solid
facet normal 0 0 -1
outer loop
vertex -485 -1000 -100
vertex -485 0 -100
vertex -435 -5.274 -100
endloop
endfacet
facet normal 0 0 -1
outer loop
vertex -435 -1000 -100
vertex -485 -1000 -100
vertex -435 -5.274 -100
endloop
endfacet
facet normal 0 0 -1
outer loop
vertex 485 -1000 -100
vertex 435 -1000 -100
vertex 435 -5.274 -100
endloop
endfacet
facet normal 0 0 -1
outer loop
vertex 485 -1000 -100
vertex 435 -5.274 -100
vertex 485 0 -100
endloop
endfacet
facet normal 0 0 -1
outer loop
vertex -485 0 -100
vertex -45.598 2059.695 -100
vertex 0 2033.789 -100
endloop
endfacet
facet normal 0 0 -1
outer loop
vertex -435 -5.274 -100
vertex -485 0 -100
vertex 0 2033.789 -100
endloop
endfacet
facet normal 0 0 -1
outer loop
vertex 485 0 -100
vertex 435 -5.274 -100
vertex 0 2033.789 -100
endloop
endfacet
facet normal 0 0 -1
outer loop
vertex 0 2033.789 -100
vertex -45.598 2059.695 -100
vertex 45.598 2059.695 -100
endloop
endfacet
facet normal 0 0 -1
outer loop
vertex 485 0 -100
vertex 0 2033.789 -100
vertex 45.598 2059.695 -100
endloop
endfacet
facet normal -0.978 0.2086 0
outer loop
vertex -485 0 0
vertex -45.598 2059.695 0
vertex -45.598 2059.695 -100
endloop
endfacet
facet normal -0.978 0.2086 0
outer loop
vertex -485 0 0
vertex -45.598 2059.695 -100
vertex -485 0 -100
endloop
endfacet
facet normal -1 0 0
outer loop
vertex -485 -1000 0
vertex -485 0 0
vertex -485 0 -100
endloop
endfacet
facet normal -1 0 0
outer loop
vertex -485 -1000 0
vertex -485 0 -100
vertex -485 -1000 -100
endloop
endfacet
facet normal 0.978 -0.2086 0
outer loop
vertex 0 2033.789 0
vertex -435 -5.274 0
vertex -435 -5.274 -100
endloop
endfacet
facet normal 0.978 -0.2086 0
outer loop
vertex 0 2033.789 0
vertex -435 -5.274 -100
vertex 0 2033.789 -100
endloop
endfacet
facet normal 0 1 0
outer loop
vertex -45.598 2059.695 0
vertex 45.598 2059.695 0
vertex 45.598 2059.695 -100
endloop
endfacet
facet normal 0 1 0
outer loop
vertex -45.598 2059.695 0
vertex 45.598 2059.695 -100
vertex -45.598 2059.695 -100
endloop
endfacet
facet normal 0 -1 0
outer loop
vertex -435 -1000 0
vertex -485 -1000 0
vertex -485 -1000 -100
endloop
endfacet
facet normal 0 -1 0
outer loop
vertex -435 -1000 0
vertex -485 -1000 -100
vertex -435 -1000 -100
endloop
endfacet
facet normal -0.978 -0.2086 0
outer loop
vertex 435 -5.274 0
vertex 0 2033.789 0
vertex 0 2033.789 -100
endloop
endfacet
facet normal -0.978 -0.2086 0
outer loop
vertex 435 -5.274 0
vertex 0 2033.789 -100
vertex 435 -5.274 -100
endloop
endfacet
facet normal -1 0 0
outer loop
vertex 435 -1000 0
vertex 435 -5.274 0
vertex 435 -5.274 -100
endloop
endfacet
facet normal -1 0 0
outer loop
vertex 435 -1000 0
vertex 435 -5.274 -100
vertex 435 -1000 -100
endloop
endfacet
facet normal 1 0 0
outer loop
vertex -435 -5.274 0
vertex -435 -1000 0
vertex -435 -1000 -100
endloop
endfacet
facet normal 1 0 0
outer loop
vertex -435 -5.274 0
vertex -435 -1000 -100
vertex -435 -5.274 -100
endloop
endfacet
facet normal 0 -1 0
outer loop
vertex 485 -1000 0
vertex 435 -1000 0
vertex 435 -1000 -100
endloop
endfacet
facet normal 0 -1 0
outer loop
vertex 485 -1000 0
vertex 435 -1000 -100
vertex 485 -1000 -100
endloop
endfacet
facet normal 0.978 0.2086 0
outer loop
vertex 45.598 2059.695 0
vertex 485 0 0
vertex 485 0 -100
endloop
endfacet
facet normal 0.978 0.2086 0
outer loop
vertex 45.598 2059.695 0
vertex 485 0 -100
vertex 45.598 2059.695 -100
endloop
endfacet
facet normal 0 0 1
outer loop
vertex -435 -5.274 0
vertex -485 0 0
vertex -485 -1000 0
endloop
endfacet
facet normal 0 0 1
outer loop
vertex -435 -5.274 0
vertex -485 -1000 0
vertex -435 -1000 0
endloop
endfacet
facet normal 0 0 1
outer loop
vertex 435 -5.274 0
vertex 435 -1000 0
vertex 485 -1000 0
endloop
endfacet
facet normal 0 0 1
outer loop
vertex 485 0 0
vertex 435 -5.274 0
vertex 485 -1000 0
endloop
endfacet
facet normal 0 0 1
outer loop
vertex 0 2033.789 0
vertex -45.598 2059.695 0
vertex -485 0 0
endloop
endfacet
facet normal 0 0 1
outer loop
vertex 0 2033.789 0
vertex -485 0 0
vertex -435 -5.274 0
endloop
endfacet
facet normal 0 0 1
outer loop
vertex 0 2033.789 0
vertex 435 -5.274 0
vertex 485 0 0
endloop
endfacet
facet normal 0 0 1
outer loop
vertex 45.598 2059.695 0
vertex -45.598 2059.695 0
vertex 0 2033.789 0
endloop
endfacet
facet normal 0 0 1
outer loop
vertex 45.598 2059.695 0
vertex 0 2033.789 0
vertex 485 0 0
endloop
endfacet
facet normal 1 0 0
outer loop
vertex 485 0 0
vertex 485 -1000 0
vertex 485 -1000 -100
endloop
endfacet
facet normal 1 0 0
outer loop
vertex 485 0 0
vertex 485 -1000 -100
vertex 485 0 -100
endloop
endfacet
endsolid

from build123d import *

# Parameters (mm, degrees)
F1_DEPTH = 100


with BuildPart() as f1:
    # F0 (on Top) → F1 (new body)
    with BuildSketch(Plane.XY):
        Polygon((-485, 0), (-485, -1000), (-435, -1000), (-435, -5.273995), (0, 2033.788505), (435, -5.273995), (435, -1000), (485, -1000), (485, 0), (45.598297, 2059.695482), (-45.598297, 2059.695482), align=None)
    extrude(amount=-F1_DEPTH)


solid = f1.part
